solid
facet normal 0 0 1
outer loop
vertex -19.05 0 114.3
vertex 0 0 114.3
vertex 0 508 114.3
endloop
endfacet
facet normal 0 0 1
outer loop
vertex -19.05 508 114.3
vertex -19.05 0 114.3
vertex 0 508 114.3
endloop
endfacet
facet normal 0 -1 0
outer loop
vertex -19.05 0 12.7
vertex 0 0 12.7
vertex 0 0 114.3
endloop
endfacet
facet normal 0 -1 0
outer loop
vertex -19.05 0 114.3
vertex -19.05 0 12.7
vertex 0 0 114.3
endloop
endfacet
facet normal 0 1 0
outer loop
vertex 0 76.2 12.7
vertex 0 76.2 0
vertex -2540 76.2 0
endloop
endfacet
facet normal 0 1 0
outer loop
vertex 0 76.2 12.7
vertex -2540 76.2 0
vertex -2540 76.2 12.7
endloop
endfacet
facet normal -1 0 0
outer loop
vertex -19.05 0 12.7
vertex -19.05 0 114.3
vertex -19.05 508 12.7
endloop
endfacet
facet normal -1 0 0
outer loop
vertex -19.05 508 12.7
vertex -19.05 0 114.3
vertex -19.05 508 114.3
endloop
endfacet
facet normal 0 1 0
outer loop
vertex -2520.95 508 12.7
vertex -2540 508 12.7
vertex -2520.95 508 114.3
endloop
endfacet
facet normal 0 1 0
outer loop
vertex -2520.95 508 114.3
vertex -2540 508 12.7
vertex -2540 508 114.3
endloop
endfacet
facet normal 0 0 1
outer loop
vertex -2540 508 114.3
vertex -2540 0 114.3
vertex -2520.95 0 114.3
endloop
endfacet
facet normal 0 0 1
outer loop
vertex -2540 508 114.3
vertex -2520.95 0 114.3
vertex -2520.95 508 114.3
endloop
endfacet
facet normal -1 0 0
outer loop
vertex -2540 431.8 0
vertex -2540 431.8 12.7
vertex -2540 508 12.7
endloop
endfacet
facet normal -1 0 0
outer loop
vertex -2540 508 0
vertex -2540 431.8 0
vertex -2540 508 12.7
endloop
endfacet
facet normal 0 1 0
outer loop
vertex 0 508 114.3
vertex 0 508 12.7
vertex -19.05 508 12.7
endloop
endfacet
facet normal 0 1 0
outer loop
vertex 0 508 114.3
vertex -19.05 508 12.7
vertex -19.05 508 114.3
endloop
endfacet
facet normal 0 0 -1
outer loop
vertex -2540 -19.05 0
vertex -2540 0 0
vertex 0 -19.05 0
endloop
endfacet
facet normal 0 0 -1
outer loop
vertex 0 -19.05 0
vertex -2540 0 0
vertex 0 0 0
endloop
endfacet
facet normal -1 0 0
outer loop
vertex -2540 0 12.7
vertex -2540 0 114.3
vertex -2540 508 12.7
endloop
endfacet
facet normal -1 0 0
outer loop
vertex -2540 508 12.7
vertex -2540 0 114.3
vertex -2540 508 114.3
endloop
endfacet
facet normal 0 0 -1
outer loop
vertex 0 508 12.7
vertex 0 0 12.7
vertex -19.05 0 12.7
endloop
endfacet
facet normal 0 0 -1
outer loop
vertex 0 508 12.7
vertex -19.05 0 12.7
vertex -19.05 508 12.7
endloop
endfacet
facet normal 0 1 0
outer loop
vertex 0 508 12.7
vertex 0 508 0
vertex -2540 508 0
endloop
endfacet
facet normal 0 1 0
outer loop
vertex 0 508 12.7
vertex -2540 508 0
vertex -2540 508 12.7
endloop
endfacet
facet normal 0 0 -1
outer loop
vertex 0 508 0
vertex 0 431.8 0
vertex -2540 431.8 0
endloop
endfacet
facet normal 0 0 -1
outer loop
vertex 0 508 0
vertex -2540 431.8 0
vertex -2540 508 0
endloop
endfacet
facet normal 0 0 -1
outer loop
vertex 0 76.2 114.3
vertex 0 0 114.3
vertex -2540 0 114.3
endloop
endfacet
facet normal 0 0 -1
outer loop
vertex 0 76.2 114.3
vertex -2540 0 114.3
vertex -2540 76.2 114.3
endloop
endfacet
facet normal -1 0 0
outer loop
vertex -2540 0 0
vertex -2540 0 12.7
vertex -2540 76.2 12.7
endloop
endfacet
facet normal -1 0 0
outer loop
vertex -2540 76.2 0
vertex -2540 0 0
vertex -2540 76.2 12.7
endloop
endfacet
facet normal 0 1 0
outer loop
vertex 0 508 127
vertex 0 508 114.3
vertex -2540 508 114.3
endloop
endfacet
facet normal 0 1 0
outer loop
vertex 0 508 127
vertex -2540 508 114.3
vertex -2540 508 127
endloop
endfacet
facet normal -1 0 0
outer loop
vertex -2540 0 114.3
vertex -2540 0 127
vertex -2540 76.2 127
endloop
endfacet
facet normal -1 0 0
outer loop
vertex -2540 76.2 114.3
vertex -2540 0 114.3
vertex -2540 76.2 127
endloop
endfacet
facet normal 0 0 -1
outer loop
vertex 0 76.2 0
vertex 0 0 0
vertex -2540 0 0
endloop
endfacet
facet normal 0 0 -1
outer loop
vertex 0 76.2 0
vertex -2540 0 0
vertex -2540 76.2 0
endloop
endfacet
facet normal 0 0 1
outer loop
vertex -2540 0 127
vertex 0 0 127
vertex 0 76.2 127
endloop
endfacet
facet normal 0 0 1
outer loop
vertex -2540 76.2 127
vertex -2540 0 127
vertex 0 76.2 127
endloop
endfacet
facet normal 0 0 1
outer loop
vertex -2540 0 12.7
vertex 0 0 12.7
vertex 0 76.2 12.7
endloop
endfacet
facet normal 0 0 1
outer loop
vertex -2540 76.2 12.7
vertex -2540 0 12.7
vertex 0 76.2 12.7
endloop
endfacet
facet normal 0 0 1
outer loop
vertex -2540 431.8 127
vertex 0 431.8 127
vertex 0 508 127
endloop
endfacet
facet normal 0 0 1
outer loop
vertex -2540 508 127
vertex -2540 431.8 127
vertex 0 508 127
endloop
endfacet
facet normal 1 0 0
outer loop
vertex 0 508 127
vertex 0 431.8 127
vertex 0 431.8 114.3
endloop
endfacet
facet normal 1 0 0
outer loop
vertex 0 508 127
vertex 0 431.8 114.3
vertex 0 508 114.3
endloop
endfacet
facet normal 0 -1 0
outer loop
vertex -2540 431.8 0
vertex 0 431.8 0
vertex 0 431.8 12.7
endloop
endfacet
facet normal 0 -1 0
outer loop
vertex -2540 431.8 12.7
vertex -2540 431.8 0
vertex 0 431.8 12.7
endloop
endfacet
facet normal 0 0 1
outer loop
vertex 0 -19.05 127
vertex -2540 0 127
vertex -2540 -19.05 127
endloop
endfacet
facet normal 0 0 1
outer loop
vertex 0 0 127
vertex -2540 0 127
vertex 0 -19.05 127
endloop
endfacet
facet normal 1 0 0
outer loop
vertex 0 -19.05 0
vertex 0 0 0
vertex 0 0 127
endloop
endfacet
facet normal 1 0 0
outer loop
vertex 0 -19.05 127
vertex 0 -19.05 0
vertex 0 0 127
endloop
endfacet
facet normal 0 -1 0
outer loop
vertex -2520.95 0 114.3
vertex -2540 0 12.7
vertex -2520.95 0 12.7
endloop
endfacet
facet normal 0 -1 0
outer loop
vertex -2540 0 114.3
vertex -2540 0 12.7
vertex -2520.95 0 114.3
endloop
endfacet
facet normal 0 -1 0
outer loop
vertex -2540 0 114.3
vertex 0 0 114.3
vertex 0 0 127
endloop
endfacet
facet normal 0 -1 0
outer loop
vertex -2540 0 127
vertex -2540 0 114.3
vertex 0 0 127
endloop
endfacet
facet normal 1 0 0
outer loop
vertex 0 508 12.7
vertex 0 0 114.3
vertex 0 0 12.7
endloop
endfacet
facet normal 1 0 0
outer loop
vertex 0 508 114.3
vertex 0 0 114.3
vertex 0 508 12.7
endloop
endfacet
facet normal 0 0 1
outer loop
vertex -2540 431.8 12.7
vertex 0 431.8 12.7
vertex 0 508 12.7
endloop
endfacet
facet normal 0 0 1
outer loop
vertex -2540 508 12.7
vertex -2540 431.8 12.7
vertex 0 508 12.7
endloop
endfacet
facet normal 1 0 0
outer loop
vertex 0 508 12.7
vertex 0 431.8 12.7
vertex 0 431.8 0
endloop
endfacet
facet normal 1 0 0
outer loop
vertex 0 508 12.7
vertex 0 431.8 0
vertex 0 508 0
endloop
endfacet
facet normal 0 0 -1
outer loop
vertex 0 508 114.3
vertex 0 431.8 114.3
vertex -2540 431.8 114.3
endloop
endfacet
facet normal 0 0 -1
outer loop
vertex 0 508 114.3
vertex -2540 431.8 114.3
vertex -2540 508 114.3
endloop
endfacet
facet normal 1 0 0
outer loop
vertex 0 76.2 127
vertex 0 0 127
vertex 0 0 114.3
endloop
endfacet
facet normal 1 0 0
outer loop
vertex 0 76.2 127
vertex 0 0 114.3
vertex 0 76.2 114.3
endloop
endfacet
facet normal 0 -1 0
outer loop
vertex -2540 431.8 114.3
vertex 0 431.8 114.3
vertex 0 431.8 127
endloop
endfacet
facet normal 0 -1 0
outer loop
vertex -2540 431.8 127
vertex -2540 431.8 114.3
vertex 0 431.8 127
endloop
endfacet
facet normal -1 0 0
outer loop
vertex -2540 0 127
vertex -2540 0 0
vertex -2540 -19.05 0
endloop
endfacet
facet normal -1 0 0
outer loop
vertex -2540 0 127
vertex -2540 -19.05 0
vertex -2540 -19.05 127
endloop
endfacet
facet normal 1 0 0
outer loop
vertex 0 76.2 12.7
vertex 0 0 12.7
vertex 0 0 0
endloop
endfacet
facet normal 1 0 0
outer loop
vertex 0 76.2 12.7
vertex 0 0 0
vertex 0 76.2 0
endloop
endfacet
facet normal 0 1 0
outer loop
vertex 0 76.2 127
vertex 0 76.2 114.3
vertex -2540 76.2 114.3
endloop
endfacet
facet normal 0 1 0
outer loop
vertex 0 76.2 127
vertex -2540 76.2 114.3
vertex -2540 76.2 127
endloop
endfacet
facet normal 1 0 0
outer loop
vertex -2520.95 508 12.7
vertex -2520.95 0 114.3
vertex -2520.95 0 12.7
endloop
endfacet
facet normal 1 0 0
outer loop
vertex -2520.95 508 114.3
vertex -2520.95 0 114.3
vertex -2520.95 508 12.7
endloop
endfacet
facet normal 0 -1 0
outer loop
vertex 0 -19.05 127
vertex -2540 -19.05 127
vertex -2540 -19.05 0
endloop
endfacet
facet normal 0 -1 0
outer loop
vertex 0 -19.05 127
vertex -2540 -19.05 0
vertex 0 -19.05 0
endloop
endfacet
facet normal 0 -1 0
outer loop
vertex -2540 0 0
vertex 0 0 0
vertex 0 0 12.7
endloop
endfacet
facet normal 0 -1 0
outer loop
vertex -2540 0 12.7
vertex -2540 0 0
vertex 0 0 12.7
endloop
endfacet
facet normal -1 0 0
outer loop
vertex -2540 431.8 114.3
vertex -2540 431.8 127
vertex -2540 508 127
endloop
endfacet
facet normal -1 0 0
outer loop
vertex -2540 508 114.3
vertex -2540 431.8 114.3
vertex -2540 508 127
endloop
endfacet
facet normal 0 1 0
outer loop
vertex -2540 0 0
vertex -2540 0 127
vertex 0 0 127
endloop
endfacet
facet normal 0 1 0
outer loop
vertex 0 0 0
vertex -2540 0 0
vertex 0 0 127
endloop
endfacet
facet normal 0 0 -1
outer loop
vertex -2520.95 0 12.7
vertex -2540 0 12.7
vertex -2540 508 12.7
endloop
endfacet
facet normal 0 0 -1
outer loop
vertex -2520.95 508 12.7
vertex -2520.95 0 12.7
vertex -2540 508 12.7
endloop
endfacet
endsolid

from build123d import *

# Parameters (mm, degrees)
F1_W      = 508
F1_H      = 101.6
F2_DEPTH  = 19.05
F3_W      = 76.2
F3_H      = 12.7
F5_DEPTH  = 2540
F8_W      = 508
F8_H      = 101.6
F9_DEPTH  = 19.05
F10_W     = 2539.9999999998
F10_H     = 127
F11_DEPTH = 19.05


# Not quite as in the source:
# - a variable given as a bare number and used for a length is read in inches; the dataset says mm whatever the document's units were


with BuildPart() as f2:
    # F1 (on Right) → F2 (new body)
    with BuildSketch(Plane.YZ):
        with Locations((254, 63.5)):
            Rectangle(F1_W, F1_H)
    extrude(amount=-F2_DEPTH)


with BuildPart() as f5:
    # F3 (on Right) → F5 (new body, through all)
    with BuildSketch(Plane.YZ):
        with Locations((38.1, 120.65)):
            Rectangle(F3_W, F3_H)
    extrude(amount=-F5_DEPTH)


with BuildPart() as f5b:
    # F3 (on Right) → F5, piece 2 (new body, through all)
    with BuildSketch(Plane.YZ):
        with Locations((38.1, 6.35)):
            Rectangle(F3_W, F3_H)
    extrude(amount=-F5_DEPTH)


with BuildPart() as f5c:
    # F3 (on Right) → F5, piece 3 (new body, through all)
    with BuildSketch(Plane.YZ):
        with Locations((469.9, 6.35)):
            Rectangle(F3_W, F3_H)
    extrude(amount=-F5_DEPTH)


with BuildPart() as f5d:
    # F3 (on Right) → F5, piece 4 (new body, through all)
    with BuildSketch(Plane.YZ):
        with Locations((469.9, 120.65)):
            Rectangle(F3_W, F3_H)
    extrude(amount=-F5_DEPTH)


with BuildPart() as f6_1:
    # F6: copy of F2
    add(f2.part.moved(Location((-891.54, 0, 0))))


with BuildPart() as f9:
    # F8 (on offset) → F9 (new body)
    with BuildSketch(Plane.YZ.offset(-2540)):
        with Locations((254, 63.5)):
            Rectangle(F8_W, F8_H)
    extrude(amount=F9_DEPTH)


with BuildPart() as f11:
    # F10 (on face) → F11 (new body)
    with BuildSketch(Plane.XZ):
        with Locations((-1270.0000000002, 63.5)):
            Rectangle(F10_W, F10_H)
    extrude(amount=F11_DEPTH)


solid = Compound([f2.part, f5.part, f5b.part, f5c.part, f5d.part, f9.part, f11.part])
